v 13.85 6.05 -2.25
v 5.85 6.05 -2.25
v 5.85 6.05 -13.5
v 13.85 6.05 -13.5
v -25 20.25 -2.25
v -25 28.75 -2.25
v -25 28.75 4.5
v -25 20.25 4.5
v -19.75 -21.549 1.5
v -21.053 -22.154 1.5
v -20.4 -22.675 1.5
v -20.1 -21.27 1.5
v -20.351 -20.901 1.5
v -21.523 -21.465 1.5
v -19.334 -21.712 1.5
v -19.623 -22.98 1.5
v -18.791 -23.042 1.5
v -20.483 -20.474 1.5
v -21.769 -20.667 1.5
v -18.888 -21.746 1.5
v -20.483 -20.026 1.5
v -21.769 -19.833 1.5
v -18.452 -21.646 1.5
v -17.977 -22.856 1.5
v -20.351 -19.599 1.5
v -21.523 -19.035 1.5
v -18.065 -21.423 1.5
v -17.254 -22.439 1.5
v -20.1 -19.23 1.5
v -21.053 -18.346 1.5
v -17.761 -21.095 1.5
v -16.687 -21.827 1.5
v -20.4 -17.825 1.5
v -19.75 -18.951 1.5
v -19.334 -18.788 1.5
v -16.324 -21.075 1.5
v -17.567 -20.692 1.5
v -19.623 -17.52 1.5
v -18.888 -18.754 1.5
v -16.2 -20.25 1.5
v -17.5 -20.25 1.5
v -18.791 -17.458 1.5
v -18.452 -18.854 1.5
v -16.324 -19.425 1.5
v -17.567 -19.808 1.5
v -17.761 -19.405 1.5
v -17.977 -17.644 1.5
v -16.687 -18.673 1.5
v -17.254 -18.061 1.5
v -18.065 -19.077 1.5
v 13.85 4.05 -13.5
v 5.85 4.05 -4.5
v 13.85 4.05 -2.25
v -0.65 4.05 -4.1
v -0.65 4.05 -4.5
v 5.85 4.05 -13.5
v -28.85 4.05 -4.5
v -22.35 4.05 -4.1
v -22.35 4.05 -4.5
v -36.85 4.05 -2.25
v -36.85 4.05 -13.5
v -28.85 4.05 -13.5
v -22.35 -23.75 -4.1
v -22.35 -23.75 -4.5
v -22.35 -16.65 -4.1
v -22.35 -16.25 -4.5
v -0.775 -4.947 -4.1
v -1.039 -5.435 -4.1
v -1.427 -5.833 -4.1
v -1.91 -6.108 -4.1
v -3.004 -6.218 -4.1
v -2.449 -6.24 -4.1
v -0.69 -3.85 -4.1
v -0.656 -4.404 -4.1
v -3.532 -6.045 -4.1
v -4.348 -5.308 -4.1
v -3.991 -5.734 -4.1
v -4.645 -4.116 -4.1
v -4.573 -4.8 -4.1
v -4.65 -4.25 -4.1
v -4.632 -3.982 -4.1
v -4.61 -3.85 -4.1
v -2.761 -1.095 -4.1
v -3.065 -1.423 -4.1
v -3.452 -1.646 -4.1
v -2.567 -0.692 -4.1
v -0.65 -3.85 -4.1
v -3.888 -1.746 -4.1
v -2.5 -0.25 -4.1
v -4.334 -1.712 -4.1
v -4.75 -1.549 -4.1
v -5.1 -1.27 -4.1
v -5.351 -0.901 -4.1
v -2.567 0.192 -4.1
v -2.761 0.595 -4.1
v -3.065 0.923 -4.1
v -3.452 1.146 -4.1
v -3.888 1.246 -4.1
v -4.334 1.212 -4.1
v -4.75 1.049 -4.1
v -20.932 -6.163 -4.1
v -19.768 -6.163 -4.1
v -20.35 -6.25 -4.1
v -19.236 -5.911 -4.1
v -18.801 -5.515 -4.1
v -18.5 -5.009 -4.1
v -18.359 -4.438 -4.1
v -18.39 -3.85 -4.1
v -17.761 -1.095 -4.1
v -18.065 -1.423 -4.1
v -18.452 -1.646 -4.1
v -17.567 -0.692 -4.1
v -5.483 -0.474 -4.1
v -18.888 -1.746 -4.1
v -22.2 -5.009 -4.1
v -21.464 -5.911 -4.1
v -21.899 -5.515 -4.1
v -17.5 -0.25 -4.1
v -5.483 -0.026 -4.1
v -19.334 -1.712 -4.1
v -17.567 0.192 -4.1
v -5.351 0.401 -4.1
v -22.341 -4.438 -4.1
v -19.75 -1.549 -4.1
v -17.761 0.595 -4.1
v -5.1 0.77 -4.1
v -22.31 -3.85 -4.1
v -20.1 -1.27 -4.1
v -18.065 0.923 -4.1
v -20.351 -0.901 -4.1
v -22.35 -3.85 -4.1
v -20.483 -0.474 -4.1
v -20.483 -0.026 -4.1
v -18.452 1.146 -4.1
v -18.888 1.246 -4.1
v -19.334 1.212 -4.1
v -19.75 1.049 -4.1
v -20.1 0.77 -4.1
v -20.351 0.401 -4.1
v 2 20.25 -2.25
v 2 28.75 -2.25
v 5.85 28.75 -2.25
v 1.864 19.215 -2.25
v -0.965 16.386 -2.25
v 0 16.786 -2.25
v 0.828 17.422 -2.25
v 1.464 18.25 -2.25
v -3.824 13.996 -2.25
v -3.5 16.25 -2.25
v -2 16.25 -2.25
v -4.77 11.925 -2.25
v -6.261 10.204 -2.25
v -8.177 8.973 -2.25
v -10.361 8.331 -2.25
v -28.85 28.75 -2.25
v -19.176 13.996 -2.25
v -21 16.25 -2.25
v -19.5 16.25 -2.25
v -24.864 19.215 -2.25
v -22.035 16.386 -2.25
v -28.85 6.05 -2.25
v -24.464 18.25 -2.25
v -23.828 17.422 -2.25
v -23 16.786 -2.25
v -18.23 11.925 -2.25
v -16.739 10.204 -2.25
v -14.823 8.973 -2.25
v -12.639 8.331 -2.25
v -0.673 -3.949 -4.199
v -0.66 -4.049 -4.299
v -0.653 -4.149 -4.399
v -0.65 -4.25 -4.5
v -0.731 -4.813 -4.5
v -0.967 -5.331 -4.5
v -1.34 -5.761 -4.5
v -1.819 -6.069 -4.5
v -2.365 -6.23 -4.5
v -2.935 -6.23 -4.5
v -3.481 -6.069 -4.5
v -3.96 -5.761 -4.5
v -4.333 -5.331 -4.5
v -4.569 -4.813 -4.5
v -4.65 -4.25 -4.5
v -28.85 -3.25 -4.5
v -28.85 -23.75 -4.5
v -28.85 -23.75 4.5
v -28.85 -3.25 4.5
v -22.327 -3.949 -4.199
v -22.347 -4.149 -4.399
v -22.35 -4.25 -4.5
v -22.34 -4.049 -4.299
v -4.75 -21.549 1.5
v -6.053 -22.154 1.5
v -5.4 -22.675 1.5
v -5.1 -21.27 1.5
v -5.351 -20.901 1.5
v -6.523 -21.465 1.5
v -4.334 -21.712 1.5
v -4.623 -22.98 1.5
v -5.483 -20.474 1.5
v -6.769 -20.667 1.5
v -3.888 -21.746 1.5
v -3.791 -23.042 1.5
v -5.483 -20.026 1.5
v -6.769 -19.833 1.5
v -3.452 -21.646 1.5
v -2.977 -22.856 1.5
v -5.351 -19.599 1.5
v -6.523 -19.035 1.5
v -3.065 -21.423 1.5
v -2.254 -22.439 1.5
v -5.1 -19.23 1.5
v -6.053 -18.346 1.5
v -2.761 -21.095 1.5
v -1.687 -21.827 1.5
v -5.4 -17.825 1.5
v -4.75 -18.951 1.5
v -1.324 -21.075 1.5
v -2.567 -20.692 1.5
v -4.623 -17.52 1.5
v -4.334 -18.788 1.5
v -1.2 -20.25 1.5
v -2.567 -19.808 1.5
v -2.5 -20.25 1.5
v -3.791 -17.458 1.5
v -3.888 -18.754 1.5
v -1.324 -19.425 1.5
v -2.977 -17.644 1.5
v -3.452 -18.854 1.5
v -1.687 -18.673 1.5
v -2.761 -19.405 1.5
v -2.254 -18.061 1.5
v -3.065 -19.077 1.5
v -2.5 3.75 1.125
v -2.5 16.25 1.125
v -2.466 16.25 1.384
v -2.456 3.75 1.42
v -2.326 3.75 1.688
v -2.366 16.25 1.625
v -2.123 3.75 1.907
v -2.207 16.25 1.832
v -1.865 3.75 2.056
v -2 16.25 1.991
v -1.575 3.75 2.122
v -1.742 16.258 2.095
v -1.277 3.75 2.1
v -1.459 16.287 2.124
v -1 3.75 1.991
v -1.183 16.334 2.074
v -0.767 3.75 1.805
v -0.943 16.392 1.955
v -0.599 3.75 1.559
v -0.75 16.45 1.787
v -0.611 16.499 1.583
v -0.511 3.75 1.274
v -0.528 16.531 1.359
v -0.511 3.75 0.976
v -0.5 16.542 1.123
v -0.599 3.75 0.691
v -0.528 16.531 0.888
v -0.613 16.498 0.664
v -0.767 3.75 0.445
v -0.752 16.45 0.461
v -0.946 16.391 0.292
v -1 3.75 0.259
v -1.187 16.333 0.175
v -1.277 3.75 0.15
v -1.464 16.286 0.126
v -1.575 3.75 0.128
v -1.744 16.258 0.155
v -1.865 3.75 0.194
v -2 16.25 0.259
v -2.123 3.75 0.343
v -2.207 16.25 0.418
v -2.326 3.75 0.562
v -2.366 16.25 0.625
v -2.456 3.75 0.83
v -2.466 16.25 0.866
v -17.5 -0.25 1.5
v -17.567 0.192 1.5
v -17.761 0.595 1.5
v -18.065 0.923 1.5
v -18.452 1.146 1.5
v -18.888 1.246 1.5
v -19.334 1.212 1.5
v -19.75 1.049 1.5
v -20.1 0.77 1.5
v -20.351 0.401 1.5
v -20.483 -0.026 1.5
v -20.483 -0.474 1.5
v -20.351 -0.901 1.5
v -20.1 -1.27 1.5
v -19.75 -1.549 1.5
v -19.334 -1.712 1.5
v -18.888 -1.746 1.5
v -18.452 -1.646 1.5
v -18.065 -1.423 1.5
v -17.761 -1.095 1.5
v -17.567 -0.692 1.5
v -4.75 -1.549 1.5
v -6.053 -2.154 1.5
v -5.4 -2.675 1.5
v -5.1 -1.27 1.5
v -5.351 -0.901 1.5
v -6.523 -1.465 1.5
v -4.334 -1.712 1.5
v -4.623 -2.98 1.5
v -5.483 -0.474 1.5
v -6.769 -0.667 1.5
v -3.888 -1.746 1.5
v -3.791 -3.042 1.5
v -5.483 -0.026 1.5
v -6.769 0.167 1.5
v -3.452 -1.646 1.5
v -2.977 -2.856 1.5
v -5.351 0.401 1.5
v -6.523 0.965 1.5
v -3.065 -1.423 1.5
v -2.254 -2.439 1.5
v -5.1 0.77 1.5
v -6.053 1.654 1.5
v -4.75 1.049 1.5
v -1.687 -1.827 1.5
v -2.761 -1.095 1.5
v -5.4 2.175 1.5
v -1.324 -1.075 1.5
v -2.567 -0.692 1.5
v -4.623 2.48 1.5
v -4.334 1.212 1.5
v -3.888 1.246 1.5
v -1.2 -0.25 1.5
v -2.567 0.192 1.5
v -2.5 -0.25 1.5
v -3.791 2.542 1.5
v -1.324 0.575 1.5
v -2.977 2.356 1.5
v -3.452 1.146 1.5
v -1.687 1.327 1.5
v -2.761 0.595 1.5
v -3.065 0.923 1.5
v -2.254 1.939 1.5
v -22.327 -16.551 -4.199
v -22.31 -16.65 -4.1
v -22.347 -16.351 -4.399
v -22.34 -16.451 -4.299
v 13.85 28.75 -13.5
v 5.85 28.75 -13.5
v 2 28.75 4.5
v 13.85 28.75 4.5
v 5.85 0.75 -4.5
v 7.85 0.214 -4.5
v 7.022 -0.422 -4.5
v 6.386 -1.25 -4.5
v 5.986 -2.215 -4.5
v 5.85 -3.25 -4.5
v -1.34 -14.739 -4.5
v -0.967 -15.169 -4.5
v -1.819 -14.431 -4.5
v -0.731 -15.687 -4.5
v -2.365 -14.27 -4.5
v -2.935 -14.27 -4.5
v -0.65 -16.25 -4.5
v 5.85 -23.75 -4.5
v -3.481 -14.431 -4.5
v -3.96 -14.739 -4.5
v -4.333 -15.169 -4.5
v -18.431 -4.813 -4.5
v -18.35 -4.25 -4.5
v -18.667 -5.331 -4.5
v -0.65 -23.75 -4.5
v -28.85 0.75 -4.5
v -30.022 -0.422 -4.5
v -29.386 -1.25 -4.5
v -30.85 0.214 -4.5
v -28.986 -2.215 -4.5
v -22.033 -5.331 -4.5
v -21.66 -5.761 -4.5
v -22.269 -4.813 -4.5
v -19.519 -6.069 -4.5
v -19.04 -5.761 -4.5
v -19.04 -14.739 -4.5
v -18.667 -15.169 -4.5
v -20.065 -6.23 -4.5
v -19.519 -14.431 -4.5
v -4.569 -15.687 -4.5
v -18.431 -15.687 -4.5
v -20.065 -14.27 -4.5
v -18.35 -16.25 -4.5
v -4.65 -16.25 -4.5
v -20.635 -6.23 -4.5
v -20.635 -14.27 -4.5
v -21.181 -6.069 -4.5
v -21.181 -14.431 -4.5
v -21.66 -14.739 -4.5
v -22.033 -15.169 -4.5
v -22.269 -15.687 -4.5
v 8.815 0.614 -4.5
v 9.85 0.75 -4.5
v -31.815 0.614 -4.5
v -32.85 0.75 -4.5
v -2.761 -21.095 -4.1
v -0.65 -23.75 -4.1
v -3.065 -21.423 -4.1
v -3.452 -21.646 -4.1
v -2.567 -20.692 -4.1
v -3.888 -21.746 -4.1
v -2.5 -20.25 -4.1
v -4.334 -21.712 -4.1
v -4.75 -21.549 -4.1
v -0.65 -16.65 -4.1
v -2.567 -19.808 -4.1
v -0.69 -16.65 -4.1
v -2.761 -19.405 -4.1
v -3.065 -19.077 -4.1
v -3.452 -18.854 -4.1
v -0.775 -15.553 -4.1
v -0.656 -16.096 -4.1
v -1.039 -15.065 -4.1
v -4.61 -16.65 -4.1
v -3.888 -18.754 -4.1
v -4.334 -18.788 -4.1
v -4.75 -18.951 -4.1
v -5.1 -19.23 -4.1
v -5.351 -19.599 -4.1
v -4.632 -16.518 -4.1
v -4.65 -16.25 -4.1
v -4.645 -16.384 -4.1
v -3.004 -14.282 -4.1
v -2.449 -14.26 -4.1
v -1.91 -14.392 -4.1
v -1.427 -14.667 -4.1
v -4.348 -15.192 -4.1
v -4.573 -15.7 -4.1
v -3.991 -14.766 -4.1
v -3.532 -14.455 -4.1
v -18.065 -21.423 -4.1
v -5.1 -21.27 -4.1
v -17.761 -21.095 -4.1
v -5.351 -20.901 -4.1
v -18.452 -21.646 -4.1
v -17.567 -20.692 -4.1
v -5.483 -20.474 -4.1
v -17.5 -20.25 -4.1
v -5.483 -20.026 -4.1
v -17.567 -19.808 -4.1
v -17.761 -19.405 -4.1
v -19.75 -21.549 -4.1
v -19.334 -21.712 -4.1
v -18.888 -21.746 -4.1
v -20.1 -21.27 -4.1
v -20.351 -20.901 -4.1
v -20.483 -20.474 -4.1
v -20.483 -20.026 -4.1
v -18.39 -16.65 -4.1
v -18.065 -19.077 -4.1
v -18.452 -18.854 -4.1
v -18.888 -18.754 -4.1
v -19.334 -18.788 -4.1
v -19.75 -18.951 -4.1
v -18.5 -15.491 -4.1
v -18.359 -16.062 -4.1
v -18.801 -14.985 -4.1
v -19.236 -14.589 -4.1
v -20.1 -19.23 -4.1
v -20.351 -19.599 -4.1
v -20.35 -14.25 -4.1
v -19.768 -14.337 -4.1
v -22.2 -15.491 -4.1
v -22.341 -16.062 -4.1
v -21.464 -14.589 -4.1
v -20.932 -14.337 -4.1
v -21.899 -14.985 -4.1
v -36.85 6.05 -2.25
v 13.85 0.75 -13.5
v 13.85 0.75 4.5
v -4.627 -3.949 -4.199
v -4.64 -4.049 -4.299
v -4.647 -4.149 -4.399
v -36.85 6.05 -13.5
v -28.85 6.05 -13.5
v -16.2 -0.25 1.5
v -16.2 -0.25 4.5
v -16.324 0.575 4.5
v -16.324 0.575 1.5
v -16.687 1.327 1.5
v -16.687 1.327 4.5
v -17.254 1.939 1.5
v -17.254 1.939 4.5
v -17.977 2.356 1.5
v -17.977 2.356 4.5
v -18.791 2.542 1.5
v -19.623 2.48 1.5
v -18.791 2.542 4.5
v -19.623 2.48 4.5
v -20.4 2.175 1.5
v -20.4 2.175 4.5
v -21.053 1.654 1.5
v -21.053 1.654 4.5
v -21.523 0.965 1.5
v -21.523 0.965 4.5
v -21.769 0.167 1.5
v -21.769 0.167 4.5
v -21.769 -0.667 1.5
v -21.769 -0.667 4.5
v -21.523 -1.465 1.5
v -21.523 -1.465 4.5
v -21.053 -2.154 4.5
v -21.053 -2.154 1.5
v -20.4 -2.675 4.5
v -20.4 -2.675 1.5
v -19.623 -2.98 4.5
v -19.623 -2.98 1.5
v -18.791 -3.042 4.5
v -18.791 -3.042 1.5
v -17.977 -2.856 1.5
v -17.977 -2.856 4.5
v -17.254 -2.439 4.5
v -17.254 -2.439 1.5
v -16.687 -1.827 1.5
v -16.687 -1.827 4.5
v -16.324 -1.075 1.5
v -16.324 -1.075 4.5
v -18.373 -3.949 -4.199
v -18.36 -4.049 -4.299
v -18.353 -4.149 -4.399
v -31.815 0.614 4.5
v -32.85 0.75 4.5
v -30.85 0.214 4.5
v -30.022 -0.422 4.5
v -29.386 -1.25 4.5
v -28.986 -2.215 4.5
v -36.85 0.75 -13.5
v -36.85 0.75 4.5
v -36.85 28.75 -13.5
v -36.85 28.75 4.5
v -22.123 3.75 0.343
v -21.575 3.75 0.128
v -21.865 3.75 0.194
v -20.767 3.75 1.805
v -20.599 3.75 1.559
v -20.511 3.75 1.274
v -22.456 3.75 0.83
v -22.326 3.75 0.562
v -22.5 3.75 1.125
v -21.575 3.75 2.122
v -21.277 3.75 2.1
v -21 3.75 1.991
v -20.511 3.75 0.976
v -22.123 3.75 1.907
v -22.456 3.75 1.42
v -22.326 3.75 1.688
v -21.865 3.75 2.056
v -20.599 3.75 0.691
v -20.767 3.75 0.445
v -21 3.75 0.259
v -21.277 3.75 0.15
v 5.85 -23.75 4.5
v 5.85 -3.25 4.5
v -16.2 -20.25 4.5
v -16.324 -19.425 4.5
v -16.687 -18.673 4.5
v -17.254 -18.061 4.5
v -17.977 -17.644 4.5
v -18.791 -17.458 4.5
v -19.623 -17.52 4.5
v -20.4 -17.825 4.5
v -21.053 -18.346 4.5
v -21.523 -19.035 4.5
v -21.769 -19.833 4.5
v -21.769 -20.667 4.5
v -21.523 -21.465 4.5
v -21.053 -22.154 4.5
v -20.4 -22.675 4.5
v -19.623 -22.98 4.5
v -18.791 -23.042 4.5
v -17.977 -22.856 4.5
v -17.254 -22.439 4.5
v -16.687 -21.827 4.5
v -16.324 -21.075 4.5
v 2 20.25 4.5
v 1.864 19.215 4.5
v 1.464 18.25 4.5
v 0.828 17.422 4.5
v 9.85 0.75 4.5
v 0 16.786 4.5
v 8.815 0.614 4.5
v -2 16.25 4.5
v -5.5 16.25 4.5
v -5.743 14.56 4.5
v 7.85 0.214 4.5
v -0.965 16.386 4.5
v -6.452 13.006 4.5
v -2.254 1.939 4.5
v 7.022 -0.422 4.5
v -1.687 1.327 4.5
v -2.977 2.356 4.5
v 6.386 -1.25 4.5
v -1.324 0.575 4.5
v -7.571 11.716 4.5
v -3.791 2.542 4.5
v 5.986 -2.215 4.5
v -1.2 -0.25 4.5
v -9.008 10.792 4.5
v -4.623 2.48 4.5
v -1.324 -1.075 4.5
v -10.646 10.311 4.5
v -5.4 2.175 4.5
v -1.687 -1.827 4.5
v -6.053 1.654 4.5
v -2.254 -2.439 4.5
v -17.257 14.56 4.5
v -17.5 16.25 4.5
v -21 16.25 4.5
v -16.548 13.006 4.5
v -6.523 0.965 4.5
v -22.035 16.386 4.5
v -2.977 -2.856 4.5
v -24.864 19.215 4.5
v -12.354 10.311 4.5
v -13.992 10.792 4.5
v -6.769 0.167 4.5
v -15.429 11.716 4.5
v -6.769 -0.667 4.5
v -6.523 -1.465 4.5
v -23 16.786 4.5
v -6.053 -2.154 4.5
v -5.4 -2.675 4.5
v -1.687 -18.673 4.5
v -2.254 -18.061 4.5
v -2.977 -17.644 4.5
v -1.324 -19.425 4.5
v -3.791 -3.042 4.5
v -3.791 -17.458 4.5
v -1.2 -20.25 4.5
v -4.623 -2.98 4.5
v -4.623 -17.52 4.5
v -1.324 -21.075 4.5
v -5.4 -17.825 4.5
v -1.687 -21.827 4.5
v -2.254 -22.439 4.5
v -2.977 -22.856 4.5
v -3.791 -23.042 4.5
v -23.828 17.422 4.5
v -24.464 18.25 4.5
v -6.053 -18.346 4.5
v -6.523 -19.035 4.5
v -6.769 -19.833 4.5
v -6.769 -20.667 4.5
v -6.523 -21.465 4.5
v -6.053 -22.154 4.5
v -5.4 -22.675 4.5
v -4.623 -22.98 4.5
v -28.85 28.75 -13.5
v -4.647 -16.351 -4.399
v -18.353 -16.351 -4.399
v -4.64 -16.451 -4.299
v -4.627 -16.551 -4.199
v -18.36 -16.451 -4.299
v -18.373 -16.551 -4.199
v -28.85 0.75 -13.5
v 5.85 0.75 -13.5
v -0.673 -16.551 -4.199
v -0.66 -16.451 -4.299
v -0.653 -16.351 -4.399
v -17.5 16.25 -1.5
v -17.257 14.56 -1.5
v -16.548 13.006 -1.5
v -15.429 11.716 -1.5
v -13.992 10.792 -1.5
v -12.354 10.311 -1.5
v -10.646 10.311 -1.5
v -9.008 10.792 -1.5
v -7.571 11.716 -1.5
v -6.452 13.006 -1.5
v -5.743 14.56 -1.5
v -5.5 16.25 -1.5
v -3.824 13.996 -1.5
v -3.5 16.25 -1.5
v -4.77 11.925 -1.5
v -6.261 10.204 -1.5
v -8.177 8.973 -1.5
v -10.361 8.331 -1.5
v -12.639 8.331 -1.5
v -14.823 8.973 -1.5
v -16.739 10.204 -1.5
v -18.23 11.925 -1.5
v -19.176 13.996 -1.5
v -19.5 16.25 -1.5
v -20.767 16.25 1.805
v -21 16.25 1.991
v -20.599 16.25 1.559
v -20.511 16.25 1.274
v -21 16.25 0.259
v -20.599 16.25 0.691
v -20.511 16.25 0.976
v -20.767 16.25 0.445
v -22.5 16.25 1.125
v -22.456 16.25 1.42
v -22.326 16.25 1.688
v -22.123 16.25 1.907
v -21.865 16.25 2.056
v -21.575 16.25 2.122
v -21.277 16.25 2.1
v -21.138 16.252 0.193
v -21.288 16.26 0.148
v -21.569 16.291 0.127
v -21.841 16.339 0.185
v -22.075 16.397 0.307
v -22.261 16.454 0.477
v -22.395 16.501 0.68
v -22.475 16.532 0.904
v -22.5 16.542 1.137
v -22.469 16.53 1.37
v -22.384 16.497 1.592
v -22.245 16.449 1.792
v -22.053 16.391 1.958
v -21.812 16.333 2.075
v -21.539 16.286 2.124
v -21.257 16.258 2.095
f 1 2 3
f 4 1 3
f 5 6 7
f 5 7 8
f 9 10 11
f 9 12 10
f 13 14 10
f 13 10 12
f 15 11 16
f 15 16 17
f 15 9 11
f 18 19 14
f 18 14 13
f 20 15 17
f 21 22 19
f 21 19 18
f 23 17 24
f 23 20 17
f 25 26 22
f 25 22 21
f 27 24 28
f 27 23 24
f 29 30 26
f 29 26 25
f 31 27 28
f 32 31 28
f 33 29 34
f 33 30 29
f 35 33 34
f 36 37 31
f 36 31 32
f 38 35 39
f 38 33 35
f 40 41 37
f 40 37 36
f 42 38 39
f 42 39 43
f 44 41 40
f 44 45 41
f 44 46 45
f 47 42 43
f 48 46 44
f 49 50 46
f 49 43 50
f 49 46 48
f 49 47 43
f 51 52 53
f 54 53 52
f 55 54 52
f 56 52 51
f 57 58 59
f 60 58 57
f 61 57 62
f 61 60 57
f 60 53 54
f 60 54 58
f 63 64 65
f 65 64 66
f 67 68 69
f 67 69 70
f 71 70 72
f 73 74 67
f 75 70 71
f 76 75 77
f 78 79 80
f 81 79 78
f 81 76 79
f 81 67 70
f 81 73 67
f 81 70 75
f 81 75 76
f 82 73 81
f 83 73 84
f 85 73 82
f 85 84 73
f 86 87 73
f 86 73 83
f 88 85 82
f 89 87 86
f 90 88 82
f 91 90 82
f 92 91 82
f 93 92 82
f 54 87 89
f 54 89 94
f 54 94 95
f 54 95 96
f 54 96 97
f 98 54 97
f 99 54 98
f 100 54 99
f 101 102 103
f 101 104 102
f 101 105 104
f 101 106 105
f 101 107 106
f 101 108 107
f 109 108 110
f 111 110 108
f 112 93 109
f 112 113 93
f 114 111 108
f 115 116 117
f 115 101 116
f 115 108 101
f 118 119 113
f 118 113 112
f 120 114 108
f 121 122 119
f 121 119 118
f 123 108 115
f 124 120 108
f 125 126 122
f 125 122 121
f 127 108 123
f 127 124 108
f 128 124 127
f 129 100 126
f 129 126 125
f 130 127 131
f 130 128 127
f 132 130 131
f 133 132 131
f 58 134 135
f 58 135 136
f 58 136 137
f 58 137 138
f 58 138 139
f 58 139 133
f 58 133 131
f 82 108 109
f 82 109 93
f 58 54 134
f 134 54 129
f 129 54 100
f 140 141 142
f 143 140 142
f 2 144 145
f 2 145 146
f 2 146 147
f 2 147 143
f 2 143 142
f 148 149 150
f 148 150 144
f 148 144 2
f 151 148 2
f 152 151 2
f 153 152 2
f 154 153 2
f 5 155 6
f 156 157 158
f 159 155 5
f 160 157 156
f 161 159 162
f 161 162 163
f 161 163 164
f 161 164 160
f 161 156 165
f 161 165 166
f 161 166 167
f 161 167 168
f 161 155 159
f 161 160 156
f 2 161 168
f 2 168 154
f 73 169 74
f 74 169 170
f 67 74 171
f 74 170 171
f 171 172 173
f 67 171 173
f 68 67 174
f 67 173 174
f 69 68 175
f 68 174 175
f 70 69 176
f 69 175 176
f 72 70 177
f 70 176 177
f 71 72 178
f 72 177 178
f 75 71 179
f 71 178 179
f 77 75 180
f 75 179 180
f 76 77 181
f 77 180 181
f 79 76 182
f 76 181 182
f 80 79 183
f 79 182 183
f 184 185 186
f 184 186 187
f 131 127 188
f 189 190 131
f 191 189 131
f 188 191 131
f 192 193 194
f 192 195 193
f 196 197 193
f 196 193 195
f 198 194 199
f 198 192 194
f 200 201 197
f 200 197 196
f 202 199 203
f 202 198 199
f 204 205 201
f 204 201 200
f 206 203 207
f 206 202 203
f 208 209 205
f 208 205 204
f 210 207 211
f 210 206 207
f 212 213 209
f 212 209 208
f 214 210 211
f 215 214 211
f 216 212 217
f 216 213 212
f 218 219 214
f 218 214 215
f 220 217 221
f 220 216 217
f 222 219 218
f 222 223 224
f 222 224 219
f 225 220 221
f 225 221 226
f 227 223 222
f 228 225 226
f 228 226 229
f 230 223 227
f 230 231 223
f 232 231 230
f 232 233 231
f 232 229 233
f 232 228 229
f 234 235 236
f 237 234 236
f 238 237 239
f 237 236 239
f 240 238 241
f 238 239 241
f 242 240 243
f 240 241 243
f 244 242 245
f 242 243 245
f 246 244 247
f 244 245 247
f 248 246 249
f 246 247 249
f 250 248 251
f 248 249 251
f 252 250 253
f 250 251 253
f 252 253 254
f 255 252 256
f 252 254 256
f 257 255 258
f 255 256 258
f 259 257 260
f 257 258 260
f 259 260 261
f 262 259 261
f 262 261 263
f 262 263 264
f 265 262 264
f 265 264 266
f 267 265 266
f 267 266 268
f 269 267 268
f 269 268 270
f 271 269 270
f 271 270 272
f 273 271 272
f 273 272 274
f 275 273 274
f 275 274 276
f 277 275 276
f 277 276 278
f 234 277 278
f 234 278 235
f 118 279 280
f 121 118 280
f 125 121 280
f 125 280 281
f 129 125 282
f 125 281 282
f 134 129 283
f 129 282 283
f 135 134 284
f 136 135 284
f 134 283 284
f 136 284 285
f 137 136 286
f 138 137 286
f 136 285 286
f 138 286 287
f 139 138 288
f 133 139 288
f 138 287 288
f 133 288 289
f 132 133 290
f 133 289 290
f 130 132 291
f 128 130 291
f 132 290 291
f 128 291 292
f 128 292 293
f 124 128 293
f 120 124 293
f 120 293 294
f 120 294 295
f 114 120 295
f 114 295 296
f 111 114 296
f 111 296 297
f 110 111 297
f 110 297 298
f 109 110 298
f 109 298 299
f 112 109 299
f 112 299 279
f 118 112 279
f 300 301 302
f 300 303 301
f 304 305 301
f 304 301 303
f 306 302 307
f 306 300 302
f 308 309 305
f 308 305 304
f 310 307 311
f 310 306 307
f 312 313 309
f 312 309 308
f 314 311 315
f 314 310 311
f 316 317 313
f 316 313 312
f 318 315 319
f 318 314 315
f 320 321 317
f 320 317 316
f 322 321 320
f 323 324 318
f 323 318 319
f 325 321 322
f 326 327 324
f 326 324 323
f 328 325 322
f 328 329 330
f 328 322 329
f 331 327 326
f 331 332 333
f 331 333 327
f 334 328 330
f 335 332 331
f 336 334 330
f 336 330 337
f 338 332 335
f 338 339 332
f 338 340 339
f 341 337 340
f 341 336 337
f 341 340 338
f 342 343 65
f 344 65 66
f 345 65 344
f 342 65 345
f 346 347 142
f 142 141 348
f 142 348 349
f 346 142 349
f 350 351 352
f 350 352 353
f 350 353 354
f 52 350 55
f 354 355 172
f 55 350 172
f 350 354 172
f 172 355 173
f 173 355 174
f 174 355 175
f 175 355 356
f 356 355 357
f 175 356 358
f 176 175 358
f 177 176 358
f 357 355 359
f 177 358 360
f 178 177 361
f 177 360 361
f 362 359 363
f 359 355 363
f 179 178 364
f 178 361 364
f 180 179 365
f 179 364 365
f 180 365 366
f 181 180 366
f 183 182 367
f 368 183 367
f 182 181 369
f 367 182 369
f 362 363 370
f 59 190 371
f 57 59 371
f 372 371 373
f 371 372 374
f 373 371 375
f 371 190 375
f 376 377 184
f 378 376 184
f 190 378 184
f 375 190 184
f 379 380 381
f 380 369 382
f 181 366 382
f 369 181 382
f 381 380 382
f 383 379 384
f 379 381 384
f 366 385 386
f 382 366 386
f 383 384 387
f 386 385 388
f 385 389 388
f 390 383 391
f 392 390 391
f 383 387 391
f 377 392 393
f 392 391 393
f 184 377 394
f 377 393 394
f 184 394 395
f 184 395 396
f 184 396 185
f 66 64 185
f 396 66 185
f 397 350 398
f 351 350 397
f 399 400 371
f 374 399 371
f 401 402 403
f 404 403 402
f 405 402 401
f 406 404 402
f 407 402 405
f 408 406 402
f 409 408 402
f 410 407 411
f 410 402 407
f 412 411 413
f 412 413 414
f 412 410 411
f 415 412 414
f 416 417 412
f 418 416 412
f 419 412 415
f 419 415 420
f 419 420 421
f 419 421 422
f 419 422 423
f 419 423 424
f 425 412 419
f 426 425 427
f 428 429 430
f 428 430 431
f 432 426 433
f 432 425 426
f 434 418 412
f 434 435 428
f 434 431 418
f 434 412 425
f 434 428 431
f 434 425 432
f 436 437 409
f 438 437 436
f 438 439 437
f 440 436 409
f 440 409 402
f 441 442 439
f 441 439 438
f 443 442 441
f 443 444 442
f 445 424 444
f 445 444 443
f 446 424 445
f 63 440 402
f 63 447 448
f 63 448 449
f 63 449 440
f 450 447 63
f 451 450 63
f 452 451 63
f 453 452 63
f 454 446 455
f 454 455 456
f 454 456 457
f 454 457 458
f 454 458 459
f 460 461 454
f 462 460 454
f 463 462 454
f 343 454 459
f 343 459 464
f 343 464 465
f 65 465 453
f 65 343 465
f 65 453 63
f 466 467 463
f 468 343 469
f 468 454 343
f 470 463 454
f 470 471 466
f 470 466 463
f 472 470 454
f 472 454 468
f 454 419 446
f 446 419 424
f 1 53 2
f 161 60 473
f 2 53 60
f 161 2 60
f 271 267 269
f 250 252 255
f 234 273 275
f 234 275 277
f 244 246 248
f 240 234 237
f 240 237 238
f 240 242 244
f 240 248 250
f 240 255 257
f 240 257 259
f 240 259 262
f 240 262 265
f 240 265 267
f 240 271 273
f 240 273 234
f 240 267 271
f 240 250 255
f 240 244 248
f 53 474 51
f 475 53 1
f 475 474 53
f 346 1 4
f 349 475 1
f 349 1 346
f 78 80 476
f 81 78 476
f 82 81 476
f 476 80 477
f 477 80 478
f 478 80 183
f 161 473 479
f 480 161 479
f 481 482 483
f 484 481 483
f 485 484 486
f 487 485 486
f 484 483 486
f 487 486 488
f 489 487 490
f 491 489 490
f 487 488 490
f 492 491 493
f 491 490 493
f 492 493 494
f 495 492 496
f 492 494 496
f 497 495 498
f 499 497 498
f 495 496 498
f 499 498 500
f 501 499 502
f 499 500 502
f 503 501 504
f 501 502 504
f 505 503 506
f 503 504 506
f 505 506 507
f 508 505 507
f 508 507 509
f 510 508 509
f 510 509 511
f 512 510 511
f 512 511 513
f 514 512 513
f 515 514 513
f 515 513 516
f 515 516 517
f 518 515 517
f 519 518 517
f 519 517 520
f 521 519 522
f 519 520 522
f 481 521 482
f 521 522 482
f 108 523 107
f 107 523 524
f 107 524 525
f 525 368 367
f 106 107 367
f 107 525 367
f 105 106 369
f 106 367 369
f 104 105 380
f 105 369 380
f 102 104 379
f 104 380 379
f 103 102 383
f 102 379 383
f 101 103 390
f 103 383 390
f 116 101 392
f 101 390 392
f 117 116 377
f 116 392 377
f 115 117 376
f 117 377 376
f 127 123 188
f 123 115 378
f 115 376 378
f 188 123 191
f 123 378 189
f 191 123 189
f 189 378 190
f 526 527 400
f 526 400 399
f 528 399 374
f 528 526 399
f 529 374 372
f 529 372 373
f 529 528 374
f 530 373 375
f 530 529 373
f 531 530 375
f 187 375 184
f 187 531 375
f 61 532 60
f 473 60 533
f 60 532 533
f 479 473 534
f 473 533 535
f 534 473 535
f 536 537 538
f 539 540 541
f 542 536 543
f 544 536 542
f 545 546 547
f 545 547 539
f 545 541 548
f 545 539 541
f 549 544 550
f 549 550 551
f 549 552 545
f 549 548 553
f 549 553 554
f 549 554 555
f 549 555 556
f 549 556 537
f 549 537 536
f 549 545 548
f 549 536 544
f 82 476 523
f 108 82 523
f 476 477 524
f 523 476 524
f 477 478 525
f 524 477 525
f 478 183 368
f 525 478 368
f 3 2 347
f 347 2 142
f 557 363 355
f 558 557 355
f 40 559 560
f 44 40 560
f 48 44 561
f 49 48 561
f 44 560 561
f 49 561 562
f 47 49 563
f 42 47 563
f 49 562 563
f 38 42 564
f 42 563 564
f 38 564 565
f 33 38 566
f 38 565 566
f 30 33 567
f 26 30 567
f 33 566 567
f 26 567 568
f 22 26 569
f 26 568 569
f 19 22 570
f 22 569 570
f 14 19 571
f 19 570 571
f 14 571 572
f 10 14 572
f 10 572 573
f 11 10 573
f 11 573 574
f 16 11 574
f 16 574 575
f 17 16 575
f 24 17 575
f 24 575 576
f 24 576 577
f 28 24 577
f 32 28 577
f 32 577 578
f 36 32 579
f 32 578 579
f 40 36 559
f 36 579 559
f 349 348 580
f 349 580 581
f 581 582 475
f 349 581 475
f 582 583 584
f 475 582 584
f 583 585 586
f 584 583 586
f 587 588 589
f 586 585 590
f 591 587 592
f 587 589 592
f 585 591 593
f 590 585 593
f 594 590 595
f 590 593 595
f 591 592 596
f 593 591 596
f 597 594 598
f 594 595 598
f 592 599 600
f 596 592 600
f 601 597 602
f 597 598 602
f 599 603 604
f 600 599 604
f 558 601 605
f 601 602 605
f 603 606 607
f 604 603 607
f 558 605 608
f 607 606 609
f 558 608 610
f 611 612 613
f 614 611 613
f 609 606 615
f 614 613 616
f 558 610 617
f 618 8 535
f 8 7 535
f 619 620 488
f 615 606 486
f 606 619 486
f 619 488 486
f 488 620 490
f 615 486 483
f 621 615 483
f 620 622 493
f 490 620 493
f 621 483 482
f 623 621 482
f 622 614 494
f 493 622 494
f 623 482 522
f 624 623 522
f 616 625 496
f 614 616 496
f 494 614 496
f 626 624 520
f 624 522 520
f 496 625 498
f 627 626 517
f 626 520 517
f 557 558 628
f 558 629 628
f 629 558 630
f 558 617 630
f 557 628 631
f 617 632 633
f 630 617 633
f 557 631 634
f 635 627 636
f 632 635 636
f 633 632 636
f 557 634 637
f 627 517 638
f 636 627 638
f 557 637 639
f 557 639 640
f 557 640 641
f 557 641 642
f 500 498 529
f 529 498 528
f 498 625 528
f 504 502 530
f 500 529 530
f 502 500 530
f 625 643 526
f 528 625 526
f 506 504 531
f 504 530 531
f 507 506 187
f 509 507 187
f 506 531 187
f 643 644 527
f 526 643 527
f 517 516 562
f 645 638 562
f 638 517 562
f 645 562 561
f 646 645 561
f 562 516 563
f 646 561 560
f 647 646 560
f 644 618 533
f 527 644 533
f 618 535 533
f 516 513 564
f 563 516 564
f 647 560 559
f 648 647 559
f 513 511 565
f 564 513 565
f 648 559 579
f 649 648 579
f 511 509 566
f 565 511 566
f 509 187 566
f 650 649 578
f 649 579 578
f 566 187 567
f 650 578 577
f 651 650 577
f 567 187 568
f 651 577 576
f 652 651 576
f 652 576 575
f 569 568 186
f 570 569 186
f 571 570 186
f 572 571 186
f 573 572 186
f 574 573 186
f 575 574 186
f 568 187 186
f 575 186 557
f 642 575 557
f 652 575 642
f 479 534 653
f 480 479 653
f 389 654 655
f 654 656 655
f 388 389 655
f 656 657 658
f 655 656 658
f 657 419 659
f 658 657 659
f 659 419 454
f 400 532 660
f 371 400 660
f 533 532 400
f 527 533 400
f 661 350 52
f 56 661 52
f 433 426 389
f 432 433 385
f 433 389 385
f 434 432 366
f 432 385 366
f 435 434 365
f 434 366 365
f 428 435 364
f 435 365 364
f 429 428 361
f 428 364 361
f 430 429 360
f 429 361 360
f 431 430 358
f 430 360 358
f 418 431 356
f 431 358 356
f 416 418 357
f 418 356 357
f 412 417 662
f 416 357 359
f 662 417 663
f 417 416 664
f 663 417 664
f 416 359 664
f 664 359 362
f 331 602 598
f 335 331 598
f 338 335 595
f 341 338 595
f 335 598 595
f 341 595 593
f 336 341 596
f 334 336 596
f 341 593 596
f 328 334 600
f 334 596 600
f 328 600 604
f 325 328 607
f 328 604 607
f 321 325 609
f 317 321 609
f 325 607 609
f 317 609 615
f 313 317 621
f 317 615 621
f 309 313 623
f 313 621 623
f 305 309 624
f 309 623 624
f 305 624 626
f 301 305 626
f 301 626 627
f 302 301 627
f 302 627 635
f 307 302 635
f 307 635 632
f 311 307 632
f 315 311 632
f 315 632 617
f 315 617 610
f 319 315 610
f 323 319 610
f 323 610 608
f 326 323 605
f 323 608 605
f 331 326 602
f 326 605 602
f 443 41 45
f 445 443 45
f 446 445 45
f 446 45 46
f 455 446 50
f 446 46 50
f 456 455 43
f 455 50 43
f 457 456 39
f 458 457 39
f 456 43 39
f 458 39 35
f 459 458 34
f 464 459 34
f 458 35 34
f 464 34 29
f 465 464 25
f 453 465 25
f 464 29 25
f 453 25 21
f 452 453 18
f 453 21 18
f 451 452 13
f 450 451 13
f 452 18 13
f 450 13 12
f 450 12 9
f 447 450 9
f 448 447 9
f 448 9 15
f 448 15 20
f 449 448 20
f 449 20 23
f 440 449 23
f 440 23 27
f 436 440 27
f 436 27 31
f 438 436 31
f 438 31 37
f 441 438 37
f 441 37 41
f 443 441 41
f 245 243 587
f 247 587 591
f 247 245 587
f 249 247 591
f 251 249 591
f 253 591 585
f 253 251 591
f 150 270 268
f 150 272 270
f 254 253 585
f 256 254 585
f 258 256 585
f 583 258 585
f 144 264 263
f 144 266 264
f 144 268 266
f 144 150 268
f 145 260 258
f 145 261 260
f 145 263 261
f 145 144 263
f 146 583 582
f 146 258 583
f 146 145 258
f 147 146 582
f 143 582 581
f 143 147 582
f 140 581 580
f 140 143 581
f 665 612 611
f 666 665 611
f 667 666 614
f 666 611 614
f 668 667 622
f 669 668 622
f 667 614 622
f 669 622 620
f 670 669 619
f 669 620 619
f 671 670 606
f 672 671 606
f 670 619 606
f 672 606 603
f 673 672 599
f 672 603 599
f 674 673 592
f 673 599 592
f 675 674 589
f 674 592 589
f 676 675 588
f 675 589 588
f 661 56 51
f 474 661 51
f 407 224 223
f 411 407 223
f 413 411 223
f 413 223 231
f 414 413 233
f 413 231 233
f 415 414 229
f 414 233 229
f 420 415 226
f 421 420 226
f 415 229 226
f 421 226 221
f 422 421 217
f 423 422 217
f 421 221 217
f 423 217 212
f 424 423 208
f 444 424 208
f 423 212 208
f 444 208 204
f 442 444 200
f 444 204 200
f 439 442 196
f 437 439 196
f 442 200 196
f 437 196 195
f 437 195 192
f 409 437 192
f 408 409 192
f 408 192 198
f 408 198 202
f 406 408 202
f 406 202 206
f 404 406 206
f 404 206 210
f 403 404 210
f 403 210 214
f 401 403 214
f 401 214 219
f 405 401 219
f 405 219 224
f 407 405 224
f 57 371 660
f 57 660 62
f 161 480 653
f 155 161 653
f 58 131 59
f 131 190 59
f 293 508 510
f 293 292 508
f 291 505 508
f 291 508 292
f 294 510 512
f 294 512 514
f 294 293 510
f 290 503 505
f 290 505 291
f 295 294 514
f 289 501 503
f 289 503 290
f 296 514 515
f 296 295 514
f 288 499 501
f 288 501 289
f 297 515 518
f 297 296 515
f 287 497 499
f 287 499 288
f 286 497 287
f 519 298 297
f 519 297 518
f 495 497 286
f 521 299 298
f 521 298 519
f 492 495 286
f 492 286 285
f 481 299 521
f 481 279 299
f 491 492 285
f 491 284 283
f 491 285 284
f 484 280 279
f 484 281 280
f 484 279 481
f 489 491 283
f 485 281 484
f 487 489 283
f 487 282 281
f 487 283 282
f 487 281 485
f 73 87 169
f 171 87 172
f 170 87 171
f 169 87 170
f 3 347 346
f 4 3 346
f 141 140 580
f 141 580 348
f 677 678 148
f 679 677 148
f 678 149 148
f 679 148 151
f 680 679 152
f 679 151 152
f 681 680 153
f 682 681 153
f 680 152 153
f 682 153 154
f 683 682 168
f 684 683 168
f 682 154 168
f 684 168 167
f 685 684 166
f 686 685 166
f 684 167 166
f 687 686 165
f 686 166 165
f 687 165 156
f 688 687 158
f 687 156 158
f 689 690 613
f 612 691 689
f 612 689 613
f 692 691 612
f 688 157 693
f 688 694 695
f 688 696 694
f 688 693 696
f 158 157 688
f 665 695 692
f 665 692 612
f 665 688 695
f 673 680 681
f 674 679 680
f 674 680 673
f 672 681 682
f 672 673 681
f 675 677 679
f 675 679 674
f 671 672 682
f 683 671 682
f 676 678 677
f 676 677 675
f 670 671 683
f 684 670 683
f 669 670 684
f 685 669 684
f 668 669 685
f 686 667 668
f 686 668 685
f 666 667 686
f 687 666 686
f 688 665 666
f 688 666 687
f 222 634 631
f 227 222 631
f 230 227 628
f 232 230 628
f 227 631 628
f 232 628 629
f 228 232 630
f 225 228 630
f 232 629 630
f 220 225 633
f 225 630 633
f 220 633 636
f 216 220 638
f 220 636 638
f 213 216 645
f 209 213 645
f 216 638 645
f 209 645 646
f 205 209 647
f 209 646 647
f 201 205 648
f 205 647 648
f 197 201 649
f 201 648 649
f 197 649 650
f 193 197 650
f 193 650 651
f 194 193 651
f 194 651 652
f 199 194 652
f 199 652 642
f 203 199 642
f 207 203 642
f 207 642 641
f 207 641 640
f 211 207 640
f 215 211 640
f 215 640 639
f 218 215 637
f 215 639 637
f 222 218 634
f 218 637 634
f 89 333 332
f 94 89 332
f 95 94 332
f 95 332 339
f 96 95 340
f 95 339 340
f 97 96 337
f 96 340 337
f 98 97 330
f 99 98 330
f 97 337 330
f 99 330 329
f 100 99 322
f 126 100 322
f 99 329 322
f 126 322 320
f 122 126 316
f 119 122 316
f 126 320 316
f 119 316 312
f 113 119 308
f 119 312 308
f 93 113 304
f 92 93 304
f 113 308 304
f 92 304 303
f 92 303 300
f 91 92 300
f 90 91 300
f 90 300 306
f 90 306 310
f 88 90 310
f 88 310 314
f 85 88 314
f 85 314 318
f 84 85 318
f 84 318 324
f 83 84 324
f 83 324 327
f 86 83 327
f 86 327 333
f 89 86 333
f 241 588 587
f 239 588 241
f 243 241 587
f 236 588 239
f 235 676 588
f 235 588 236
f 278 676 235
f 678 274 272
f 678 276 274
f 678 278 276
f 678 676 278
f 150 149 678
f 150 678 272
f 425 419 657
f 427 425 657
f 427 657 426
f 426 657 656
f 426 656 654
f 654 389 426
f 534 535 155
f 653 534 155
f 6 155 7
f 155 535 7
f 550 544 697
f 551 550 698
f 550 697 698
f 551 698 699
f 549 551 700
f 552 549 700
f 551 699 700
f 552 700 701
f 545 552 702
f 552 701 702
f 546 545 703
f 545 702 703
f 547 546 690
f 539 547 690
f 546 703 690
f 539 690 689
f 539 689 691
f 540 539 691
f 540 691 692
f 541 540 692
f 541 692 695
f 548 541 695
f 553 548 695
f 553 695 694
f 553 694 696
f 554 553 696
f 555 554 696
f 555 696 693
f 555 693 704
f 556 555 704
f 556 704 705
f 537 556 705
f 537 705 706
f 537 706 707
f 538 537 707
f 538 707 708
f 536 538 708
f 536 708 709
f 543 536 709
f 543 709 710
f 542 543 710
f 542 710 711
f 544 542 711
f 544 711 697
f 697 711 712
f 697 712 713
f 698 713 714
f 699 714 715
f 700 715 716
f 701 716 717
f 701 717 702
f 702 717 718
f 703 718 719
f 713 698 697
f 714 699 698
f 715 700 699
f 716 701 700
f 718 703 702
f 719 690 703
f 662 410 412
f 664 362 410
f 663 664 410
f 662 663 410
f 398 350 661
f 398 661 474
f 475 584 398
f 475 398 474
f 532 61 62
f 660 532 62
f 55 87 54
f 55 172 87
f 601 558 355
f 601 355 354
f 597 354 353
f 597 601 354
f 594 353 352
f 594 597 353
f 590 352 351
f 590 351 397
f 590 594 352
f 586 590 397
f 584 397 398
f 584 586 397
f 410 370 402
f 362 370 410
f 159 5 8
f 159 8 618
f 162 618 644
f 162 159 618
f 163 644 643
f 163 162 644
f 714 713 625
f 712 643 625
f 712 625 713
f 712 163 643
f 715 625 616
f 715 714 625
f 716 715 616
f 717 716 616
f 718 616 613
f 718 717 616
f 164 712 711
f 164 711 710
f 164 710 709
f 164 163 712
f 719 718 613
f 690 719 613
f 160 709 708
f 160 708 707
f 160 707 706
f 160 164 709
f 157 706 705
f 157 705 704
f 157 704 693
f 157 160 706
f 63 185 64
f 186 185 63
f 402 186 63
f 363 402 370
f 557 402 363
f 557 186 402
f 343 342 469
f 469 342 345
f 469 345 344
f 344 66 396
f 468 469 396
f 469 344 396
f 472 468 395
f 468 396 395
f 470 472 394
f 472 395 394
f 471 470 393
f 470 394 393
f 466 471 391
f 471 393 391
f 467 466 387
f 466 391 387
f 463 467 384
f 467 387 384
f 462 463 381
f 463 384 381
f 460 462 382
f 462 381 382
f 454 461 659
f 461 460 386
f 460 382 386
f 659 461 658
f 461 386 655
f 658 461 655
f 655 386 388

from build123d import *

# Parameters (mm, degrees)
BOSS_EXTRUDE1_DEPTH      = 4.5
SKETCH4_W                = 35.509158229
SKETCH4_H                = 48.512063823
CUT_EXTRUDE2_DEPTH       = 10
SKETCH8_W                = 66
SKETCH8_H                = 9
BOSS_EXTRUDE3_DEPTH      = 5
FILLET7_R                = 10
SKETCH16_R               = 1.5
CUT_EXTRUDE6_DEPTH       = 10
SKETCH17_W               = 15.65
SKETCH17_H               = 52.5
CUT_EXTRUDE7_DEPTH       = 10
SKETCH18_R               = 6
CUT_EXTRUDE8_DEPTH       = 10
SKETCH20_W               = 8
SKETCH20_H               = 28
BOSS_EXTRUDE5_DEPTH      = 18
CUT_EXTRUDE10_DEPTH      = 51.084778127
CUT_EXTRUDE10_DEPTH_BACK = 9
SKETCH23_R               = 8
CUT_EXTRUDE11_DEPTH      = 3
CUT_EXTRUDE12_DEPTH      = 68.0001
CUT_EXTRUDE12_DEPTH_BACK = 8
CUT_EXTRUDE12_START      = -42.7
SKETCH24_W               = 11.249996001
SKETCH24_H               = 2
SKETCH25_R               = 1
CUT_EXTRUDE13_DEPTH      = 12.5
CUT_EXTRUDE15_DEPTH      = 2.25
FILLET8_R                = 4
SKETCH27_W               = 21.7
SKETCH27_H               = 7.5
CUT_EXTRUDE16_DEPTH      = 0.4
CHAMFER1_SIZE            = 0.4
CHAMFER2_SIZE            = 0.4
SKETCH28_R               = 2.8
CUT_EXTRUDE17_DEPTH      = 3
SKETCH29_R               = 2
SKETCH29_W               = 21.7
SKETCH29_H               = 0.8
CUT_EXTRUDE18_DEPTH      = 0.4


# Some blends are built 0.0001 mm under size
with BuildPart() as part:
    # Sketch1 → Boss-Extrude1 (new, symmetric)
    with BuildSketch(Plane.XY):
        Polygon((44.5, -23.75), (-0.5, -23.75), (-44.5, -23.75), (-44.5, 23.75), (44.5, 23.75), align=None)
    extrude(amount=BOSS_EXTRUDE1_DEPTH, both=True)

    # Sketch4 → Cut-Extrude2 (cut)
    with BuildSketch(Plane.XY.offset(4.5)):
        with Locations((39.254579115, -0.506031912)):
            Rectangle(SKETCH4_W, SKETCH4_H)
    extrude(amount=-CUT_EXTRUDE2_DEPTH, mode=Mode.SUBTRACT)

    # Sketch8 → Boss-Extrude3 (add)
    with BuildSketch(Plane(origin=(0, 23.75, 0), x_dir=(1, 0, 0), z_dir=(0, 1, 0))):
        with Locations((-11.5, 0)):
            Rectangle(SKETCH8_W, SKETCH8_H)
    extrude(amount=BOSS_EXTRUDE3_DEPTH)

    # Fillet7
    fillet7_edges = [part.edges().sort_by_distance(p)[0] for p in [
        (-44.5, 28.75, 0),
        (21.5, 28.75, 0),
    ]]
    fillet(fillet7_edges, radius=FILLET7_R)

    # Sketch16 → Cut-Extrude6 (cut)
    with BuildSketch(Plane.XY.offset(4.5)):
        with Locations((-19, -0.25)):
            Circle(SKETCH16_R)
        with Locations((-4, -0.25)):
            Circle(SKETCH16_R)
        with Locations((-19, -20.25)):
            Circle(SKETCH16_R)
        with Locations((-4, -20.25)):
            Circle(SKETCH16_R)
    extrude(amount=-CUT_EXTRUDE6_DEPTH, mode=Mode.SUBTRACT)

    # Sketch17 → Cut-Extrude7 (cut)
    with BuildSketch(Plane(origin=(0, 0, -4.5), x_dir=(-1, 0, 0), z_dir=(0, 0, -1))):
        with Locations((36.675, 2.5)):
            Rectangle(SKETCH17_W, SKETCH17_H)
        with Locations((-13.675, 2.5)):
            Rectangle(SKETCH17_W, SKETCH17_H)
    extrude(amount=-CUT_EXTRUDE7_DEPTH, mode=Mode.SUBTRACT)

    # Sketch18 → Cut-Extrude8 (cut)
    with BuildSketch(Plane.XY.offset(4.5)):
        with Locations((-11.5, 16.25)):
            Circle(SKETCH18_R)
    extrude(amount=-CUT_EXTRUDE8_DEPTH, mode=Mode.SUBTRACT)

    # Sketch20 → Boss-Extrude5 (add)
    with BuildSketch(Plane.XY.offset(4.5)):
        with Locations((-32.85, 14.75)):
            Rectangle(SKETCH20_W, SKETCH20_H)
        with Locations((9.85, 14.75)):
            Rectangle(SKETCH20_W, SKETCH20_H)
    extrude(amount=-BOSS_EXTRUDE5_DEPTH)

    # Sketch22 → Cut-Extrude10 (cut, two sides: drawn at the far end of the back side and taken through both)
    with BuildSketch(Plane.XY.offset(4.5).offset(-CUT_EXTRUDE10_DEPTH_BACK)):
        Polygon((-25, 169.372700937), (-25, 28.75), (-25, 16.25), (2, 16.25), (2, 28.75), (2, 169.372700937), (2, 450.61810281), (-25, 450.61810281), align=None)
    extrude(amount=CUT_EXTRUDE10_DEPTH + CUT_EXTRUDE10_DEPTH_BACK, mode=Mode.SUBTRACT)

    # Sketch23 → Cut-Extrude11 (cut)
    with BuildSketch(Plane(origin=(0, 0, -4.5), x_dir=(-1, 0, 0), z_dir=(0, 0, -1))):
        with Locations((11.5, 16.25)):
            Circle(SKETCH23_R)
    extrude(amount=-CUT_EXTRUDE11_DEPTH, mode=Mode.SUBTRACT)

    # Sketch24 → Cut-Extrude12 (cut, two sides: drawn at the far end of the back side and taken through both)
    with BuildSketch(Plane(origin=(13.85, 0, 0), x_dir=(0, 0, -1), z_dir=(1, 0, 0)).offset(CUT_EXTRUDE12_START - CUT_EXTRUDE12_DEPTH_BACK)):
        with Locations((7.875002, 5.05)):
            Rectangle(SKETCH24_W, SKETCH24_H)
    extrude(amount=CUT_EXTRUDE12_DEPTH + CUT_EXTRUDE12_DEPTH_BACK, mode=Mode.SUBTRACT)

    # Sketch25 → Cut-Extrude13 (cut)
    with BuildSketch(Plane(origin=(0, 16.25, 0), x_dir=(1, 0, 0), z_dir=(0, 1, 0))):
        with Locations(Location((-1.5, -1.125, 0), (0, 0, 180))):
            Circle(SKETCH25_R)
        with Locations(Location((-21.5, -1.125, 0), (0, 0, 180))):
            Circle(SKETCH25_R)
    extrude(amount=-CUT_EXTRUDE13_DEPTH, mode=Mode.SUBTRACT)

    # Sketch26 → Cut-Extrude15 (cut)
    with BuildSketch(Plane(origin=(0, 0, -4.5), x_dir=(-1, 0, 0), z_dir=(0, 0, -1))):
        with BuildLine():
            Line((-5.85, 6.05), (28.85, 6.05))
            Line((28.85, 6.05), (28.85, 28.75))
            Line((28.85, 28.75), (25, 28.75))
            Line((25, 28.75), (25, 16.25))
            Line((25, 16.25), (19.5, 16.25))
            ThreePointArc((19.5, 16.25), (11.5, 8.25), (3.5, 16.25))
            Line((3.5, 16.25), (-2, 16.25))
            Line((-2, 16.25), (-2, 28.75))
            Line((-2, 28.75), (-5.85, 28.75))
            Line((-5.85, 28.75), (-5.85, 6.05))
        make_face()
    extrude(amount=-CUT_EXTRUDE15_DEPTH, mode=Mode.SUBTRACT)

    # Fillet8
    # the kernel refuses this fillet: 4 mm, written as the material it adds along each edge
    with BuildSketch(Plane(origin=(-28.85, 0.75, 4.5), x_dir=(-1, 0, 0), z_dir=(0, 0, -1))) as fillet8_piece_1:
        with BuildLine():
            CenterArc((FILLET8_R, -FILLET8_R), FILLET8_R, 90, 90)
            Line((0, -FILLET8_R), (0, 0))
            Line((0, 0), (FILLET8_R, 0))
        make_face()
    extrude(amount=9)
    with BuildSketch(Plane(origin=(5.85, 0.75, 4.5), x_dir=(1, 0, 0), z_dir=(0, 0, -1))) as fillet8_piece_2:
        with BuildLine():
            CenterArc((FILLET8_R, FILLET8_R), FILLET8_R, 180, 90)
            Line((0, FILLET8_R), (0, 0))
            Line((0, 0), (FILLET8_R, 0))
        make_face()
    extrude(amount=9)
    with BuildSketch(Plane(origin=(2, 16.25, -2.25), x_dir=(-1, 0, 0), z_dir=(0, 0, 1))) as fillet8_piece_3_section:
        with BuildLine():
            CenterArc((FILLET8_R, -FILLET8_R), FILLET8_R, 90, 90)
            Line((0, -FILLET8_R), (0, 0))
            Line((0, 0), (FILLET8_R, 0))
        make_face()
    fillet8_piece_3 = extrude(amount=6.75, mode=Mode.PRIVATE)
    fillet8_piece_3 = fillet8_piece_3 - Plane(origin=(-1.5, 17.15044089, 1.125), x_dir=(-1, 0, 0), z_dir=(0, 1, 0)) * Cylinder(1, 30, mode=Mode.PRIVATE)
    add(fillet8_piece_3)
    with BuildSketch(Plane(origin=(-25, 16.25, -2.25), x_dir=(0, 1, 0), z_dir=(0, 0, 1))) as fillet8_piece_4_section:
        with BuildLine():
            CenterArc((FILLET8_R, -FILLET8_R), FILLET8_R, 90, 90)
            Line((0, -FILLET8_R), (0, 0))
            Line((0, 0), (FILLET8_R, 0))
        make_face()
    fillet8_piece_4 = extrude(amount=6.75, mode=Mode.PRIVATE)
    fillet8_piece_4 = fillet8_piece_4 - Plane(origin=(-21.5, 17.150440868, 1.125), x_dir=(-1, 0, 0), z_dir=(0, 1, 0)) * Cylinder(1, 30, mode=Mode.PRIVATE)
    add(fillet8_piece_4)

    # Sketch27 → Cut-Extrude16 (cut)
    with BuildSketch(Plane(origin=(0, 0, -4.5), x_dir=(-1, 0, 0), z_dir=(0, 0, -1))):
        with Locations((11.5, -20)):
            Rectangle(SKETCH27_W, SKETCH27_H)
        with Locations((11.5, -0.5)):
            Rectangle(SKETCH27_W, SKETCH27_H)
    extrude(amount=-CUT_EXTRUDE16_DEPTH, mode=Mode.SUBTRACT)

    # Chamfer1
    chamfer1_edges = [part.edges().sort_by_distance(p)[0] for p in [
        (-11.5, -4.25, -4.1),
    ]]
    chamfer(chamfer1_edges, length=CHAMFER1_SIZE - 0.0001)  # a hair under: the kernel refuses the full size

    # Chamfer2
    chamfer2_edges = [part.edges().sort_by_distance(p)[0] for p in [
        (-11.5, -16.25, -4.1),
    ]]
    chamfer(chamfer2_edges, length=CHAMFER2_SIZE - 0.0001)  # a hair under: the kernel refuses the full size

    # Sketch28 → Cut-Extrude17 (cut)
    with BuildSketch(Plane.XY.offset(4.5)):
        with Locations((-19, -0.25)):
            Circle(SKETCH28_R)
        with Locations((-4, -0.25)):
            Circle(SKETCH28_R)
        with Locations((-4, -20.25)):
            Circle(SKETCH28_R)
        with Locations((-19, -20.25)):
            Circle(SKETCH28_R)
    extrude(amount=-CUT_EXTRUDE17_DEPTH, mode=Mode.SUBTRACT)

    # Sketch29 → Cut-Extrude18 (cut)
    with BuildSketch(Plane(origin=(0, 0, -4.5), x_dir=(-1, 0, 0), z_dir=(0, 0, -1))):
        with Locations((2.65, -4.25)):
            Circle(SKETCH29_R)
        with Locations((20.35, -4.25)):
            Circle(SKETCH29_R)
        with Locations((2.65, -16.25)):
            Circle(SKETCH29_R)
        with Locations((20.35, -16.25)):
            Circle(SKETCH29_R)
        with Locations((11.5, 3.65)):
            Rectangle(SKETCH29_W, SKETCH29_H)
    extrude(amount=-CUT_EXTRUDE18_DEPTH, mode=Mode.SUBTRACT)


solid = part.part
